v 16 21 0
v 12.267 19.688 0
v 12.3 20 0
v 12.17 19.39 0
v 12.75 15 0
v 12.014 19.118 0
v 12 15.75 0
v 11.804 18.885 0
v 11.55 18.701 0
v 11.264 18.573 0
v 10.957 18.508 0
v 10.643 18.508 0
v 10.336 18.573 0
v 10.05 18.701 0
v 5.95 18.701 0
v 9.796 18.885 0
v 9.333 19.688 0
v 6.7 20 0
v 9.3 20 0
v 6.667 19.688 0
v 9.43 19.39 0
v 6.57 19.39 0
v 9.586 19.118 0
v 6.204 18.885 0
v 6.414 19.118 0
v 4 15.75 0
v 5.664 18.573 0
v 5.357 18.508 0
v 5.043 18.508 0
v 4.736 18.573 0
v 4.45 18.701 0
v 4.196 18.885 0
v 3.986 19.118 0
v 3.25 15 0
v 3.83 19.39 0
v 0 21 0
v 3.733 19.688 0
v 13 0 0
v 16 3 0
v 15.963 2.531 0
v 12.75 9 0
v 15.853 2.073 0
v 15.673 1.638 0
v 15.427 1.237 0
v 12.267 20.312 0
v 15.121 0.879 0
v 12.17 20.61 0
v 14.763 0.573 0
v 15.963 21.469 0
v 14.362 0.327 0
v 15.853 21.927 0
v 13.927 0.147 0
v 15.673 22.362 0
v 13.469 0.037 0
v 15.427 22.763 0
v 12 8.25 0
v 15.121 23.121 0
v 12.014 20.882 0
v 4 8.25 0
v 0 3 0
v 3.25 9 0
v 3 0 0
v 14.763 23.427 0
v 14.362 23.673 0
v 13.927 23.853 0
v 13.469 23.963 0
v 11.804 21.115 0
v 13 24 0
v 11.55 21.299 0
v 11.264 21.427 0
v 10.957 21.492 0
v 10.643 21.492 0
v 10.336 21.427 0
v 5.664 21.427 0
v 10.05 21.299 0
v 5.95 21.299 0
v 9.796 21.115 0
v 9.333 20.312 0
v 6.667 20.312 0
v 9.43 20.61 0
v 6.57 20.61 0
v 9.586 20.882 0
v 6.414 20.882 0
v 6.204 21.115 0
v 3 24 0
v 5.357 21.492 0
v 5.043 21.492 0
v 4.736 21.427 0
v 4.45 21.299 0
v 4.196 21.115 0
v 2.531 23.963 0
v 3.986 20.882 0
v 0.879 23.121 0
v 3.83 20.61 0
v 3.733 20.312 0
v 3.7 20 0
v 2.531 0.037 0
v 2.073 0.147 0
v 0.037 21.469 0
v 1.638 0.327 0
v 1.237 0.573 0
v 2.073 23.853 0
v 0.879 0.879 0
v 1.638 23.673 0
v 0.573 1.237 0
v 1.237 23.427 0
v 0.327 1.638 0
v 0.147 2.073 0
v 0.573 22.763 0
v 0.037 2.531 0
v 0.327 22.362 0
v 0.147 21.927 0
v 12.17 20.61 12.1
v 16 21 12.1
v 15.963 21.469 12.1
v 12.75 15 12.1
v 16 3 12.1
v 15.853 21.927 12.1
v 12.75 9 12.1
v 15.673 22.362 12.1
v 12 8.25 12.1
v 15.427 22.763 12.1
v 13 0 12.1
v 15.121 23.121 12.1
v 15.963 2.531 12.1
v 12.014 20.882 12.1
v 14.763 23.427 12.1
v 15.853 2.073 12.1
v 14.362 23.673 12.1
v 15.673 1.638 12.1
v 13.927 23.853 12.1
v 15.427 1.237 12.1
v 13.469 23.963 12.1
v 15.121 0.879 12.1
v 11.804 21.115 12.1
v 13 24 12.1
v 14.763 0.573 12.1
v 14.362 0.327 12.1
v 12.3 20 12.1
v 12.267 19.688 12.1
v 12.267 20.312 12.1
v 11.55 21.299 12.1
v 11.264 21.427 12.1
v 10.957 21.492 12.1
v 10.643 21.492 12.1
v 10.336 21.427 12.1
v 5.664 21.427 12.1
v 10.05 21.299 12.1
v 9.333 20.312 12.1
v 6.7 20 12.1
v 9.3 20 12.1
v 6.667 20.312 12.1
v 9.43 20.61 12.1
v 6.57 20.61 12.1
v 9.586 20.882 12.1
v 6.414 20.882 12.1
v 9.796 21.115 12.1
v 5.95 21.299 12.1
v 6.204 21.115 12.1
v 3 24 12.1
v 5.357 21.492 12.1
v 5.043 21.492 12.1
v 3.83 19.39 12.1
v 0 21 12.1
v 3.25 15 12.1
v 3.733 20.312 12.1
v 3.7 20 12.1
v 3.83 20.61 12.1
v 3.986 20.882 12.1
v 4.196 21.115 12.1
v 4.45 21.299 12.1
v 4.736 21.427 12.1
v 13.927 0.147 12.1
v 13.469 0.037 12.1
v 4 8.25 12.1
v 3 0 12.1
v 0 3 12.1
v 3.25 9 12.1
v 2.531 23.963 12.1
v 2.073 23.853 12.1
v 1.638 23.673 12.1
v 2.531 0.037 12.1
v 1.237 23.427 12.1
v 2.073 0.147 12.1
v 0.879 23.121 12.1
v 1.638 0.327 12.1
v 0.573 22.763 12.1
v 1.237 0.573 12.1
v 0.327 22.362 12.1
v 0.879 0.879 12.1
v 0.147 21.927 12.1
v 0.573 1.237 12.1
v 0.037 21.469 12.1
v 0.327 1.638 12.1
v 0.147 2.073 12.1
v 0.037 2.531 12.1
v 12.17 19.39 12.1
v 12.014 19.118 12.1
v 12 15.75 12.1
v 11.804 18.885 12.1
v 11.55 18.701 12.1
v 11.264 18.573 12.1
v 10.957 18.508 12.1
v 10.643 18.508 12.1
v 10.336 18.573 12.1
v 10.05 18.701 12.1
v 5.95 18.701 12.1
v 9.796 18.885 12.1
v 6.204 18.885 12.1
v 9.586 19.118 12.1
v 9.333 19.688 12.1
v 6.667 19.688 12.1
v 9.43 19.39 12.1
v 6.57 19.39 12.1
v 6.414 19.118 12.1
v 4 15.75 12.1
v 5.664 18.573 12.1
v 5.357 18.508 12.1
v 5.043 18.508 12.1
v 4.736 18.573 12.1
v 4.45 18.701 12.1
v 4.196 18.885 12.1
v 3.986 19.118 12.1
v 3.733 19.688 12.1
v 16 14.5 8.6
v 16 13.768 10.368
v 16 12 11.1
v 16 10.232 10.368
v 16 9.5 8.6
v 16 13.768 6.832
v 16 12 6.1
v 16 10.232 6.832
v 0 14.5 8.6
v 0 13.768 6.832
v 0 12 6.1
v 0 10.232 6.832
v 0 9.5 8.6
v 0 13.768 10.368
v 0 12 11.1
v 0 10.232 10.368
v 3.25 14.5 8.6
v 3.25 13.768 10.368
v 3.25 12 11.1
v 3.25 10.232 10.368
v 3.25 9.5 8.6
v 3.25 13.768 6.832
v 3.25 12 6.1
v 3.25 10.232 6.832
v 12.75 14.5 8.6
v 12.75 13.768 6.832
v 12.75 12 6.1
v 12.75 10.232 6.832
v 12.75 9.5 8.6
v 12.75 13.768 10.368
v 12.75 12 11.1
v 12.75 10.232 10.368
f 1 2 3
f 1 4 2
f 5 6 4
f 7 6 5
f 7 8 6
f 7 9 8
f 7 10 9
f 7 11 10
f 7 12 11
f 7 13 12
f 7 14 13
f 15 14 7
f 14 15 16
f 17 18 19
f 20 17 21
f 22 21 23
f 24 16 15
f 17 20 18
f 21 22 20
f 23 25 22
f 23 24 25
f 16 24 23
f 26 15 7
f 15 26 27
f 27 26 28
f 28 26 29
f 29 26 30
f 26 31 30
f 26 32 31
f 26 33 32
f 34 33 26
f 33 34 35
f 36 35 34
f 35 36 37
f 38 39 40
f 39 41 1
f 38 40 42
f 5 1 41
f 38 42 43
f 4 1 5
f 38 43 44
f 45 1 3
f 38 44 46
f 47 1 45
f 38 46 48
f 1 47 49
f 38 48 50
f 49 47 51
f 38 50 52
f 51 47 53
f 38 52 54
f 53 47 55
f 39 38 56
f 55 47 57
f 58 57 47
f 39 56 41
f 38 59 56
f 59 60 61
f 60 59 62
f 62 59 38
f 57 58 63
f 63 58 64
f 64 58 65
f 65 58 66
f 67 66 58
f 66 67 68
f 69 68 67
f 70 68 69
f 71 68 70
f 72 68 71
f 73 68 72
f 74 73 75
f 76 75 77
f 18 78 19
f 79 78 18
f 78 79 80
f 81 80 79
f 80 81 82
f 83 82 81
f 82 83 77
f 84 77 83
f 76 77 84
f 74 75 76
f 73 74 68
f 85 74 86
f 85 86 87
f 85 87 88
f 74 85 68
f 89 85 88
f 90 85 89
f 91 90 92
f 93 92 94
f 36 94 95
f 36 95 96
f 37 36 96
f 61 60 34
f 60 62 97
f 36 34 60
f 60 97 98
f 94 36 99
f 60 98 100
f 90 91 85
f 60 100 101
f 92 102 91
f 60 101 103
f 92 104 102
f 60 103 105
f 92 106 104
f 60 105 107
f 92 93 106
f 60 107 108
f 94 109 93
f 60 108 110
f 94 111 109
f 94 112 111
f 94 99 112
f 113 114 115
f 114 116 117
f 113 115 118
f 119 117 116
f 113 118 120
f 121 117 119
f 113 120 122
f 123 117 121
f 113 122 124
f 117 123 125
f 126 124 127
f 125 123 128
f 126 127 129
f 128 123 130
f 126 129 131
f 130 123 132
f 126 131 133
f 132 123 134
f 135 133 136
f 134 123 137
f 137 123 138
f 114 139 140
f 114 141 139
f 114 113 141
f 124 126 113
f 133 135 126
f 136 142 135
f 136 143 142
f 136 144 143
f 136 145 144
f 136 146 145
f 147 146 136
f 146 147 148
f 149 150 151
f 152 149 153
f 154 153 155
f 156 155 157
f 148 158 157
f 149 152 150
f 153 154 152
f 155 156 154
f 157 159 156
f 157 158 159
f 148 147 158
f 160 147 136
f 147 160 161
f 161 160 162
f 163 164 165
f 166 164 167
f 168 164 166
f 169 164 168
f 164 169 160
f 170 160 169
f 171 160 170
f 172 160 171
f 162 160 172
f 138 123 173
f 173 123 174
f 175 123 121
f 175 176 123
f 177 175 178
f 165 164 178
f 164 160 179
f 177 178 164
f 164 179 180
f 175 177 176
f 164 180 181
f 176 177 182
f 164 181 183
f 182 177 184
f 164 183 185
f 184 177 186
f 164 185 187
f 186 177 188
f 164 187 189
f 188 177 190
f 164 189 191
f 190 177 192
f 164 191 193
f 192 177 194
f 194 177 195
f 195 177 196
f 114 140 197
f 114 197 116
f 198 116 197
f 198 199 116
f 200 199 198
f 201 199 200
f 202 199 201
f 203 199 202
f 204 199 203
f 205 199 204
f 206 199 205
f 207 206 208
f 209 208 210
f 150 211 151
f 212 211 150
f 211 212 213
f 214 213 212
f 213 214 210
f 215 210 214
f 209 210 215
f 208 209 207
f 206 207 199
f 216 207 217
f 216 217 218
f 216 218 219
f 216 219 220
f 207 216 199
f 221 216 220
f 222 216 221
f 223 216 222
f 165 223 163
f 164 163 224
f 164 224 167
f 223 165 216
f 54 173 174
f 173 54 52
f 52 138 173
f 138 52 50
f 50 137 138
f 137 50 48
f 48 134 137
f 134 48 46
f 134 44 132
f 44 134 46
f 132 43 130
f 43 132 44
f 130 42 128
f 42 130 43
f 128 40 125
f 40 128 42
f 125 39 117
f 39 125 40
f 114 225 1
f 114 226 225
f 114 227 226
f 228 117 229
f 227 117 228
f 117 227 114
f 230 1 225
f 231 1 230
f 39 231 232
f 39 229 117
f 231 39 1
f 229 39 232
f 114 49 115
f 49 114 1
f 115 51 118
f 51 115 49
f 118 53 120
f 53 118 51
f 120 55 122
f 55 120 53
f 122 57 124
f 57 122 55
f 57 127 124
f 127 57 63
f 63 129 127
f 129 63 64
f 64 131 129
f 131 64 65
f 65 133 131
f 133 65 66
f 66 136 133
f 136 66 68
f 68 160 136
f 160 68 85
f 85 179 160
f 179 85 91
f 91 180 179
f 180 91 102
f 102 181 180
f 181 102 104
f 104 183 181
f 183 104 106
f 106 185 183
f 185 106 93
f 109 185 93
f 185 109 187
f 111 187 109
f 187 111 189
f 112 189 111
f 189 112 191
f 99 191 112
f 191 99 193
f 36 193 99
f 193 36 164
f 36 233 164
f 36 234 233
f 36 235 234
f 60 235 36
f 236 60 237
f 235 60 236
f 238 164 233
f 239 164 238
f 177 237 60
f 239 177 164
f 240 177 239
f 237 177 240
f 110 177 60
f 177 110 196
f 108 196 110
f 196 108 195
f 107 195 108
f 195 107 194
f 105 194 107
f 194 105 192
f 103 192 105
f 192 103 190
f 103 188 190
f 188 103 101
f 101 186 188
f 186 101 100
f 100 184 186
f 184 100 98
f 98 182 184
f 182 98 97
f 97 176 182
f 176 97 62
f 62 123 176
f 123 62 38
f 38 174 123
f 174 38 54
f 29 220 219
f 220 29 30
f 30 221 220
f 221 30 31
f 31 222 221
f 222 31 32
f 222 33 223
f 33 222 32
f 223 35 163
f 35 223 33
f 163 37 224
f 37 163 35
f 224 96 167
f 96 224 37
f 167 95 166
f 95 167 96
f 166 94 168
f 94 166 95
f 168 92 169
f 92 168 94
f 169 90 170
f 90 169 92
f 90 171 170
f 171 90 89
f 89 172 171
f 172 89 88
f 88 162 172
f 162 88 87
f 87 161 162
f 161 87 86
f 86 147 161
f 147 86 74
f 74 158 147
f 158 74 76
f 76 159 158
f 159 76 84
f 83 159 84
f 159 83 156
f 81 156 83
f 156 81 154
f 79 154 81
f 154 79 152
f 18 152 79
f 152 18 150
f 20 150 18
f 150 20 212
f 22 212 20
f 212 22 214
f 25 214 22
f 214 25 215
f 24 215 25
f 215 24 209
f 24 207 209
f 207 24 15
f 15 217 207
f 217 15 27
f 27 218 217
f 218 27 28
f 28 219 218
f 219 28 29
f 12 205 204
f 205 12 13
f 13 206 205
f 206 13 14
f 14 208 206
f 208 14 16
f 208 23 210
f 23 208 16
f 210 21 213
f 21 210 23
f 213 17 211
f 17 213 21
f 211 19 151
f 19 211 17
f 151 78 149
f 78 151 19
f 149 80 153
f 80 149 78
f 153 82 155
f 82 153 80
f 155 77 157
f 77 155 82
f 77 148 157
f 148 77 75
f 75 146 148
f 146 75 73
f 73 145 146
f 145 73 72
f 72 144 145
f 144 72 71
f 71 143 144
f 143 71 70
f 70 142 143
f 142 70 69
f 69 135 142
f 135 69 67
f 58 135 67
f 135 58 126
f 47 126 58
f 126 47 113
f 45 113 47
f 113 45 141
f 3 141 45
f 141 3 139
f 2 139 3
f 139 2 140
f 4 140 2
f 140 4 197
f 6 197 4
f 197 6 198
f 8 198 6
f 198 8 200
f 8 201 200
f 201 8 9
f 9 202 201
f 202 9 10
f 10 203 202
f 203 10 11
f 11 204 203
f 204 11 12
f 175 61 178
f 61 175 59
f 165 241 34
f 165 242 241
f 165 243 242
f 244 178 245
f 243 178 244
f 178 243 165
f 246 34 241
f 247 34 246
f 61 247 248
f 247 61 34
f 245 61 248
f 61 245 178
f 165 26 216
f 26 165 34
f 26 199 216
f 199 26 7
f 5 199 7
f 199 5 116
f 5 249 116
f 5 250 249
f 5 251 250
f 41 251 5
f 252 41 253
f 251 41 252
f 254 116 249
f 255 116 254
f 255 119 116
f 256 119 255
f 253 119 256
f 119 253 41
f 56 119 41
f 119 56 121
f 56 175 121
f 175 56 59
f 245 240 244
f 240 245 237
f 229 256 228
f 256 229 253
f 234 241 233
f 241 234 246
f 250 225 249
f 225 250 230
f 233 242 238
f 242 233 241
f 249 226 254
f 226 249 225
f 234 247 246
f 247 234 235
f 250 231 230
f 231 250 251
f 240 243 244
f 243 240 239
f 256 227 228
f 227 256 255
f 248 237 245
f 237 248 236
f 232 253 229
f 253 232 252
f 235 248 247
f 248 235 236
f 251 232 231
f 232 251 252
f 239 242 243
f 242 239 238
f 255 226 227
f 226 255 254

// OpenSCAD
// part_id: b11
// name: B11 carrier block
// source_drawing_ids: DRW-002
// units: mm
// revision: 0.1
// SPDX-License-Identifier: MIT

module b11_profile_2d(w = 16, h = 24, corner_r = 3) {
    difference() {
        hull() {
            translate([corner_r, corner_r]) circle(r = corner_r, $fn = 40);
            translate([w - corner_r, corner_r]) circle(r = corner_r, $fn = 40);
            translate([corner_r, h - corner_r]) circle(r = corner_r, $fn = 40);
            translate([w - corner_r, h - corner_r]) circle(r = corner_r, $fn = 40);
        }
        // Center window
        translate([w / 2 - 4, h / 2 - 3]) offset(r = 0.75) square([8, 6], center = false);
        // Twin top holes
        for (x = [w / 2 - 2.8, w / 2 + 2.8]) translate([x, h - 4]) circle(d = 3.0, $fn = 30);
        // Through axis hole
        translate([w / 2, h / 2]) circle(d = 3.0, $fn = 30);
    }
}

module part_b11(w = 16, h = 24, t = 12.1) {
    difference() {
        linear_extrude(height = t)
            b11_profile_2d(w = w, h = h);

        // Side shaft bore for b13.
        translate([w / 2, h / 2, t - 3.5])
            rotate([0, 90, 0])
                cylinder(d = 5.0, h = w + 0.4, center = true);
    }
}

// ---- "main guard" ----
// Default to previewing when opened directly:
if (is_undef(__LIB_MODE__)) {
    part_b11();
}
